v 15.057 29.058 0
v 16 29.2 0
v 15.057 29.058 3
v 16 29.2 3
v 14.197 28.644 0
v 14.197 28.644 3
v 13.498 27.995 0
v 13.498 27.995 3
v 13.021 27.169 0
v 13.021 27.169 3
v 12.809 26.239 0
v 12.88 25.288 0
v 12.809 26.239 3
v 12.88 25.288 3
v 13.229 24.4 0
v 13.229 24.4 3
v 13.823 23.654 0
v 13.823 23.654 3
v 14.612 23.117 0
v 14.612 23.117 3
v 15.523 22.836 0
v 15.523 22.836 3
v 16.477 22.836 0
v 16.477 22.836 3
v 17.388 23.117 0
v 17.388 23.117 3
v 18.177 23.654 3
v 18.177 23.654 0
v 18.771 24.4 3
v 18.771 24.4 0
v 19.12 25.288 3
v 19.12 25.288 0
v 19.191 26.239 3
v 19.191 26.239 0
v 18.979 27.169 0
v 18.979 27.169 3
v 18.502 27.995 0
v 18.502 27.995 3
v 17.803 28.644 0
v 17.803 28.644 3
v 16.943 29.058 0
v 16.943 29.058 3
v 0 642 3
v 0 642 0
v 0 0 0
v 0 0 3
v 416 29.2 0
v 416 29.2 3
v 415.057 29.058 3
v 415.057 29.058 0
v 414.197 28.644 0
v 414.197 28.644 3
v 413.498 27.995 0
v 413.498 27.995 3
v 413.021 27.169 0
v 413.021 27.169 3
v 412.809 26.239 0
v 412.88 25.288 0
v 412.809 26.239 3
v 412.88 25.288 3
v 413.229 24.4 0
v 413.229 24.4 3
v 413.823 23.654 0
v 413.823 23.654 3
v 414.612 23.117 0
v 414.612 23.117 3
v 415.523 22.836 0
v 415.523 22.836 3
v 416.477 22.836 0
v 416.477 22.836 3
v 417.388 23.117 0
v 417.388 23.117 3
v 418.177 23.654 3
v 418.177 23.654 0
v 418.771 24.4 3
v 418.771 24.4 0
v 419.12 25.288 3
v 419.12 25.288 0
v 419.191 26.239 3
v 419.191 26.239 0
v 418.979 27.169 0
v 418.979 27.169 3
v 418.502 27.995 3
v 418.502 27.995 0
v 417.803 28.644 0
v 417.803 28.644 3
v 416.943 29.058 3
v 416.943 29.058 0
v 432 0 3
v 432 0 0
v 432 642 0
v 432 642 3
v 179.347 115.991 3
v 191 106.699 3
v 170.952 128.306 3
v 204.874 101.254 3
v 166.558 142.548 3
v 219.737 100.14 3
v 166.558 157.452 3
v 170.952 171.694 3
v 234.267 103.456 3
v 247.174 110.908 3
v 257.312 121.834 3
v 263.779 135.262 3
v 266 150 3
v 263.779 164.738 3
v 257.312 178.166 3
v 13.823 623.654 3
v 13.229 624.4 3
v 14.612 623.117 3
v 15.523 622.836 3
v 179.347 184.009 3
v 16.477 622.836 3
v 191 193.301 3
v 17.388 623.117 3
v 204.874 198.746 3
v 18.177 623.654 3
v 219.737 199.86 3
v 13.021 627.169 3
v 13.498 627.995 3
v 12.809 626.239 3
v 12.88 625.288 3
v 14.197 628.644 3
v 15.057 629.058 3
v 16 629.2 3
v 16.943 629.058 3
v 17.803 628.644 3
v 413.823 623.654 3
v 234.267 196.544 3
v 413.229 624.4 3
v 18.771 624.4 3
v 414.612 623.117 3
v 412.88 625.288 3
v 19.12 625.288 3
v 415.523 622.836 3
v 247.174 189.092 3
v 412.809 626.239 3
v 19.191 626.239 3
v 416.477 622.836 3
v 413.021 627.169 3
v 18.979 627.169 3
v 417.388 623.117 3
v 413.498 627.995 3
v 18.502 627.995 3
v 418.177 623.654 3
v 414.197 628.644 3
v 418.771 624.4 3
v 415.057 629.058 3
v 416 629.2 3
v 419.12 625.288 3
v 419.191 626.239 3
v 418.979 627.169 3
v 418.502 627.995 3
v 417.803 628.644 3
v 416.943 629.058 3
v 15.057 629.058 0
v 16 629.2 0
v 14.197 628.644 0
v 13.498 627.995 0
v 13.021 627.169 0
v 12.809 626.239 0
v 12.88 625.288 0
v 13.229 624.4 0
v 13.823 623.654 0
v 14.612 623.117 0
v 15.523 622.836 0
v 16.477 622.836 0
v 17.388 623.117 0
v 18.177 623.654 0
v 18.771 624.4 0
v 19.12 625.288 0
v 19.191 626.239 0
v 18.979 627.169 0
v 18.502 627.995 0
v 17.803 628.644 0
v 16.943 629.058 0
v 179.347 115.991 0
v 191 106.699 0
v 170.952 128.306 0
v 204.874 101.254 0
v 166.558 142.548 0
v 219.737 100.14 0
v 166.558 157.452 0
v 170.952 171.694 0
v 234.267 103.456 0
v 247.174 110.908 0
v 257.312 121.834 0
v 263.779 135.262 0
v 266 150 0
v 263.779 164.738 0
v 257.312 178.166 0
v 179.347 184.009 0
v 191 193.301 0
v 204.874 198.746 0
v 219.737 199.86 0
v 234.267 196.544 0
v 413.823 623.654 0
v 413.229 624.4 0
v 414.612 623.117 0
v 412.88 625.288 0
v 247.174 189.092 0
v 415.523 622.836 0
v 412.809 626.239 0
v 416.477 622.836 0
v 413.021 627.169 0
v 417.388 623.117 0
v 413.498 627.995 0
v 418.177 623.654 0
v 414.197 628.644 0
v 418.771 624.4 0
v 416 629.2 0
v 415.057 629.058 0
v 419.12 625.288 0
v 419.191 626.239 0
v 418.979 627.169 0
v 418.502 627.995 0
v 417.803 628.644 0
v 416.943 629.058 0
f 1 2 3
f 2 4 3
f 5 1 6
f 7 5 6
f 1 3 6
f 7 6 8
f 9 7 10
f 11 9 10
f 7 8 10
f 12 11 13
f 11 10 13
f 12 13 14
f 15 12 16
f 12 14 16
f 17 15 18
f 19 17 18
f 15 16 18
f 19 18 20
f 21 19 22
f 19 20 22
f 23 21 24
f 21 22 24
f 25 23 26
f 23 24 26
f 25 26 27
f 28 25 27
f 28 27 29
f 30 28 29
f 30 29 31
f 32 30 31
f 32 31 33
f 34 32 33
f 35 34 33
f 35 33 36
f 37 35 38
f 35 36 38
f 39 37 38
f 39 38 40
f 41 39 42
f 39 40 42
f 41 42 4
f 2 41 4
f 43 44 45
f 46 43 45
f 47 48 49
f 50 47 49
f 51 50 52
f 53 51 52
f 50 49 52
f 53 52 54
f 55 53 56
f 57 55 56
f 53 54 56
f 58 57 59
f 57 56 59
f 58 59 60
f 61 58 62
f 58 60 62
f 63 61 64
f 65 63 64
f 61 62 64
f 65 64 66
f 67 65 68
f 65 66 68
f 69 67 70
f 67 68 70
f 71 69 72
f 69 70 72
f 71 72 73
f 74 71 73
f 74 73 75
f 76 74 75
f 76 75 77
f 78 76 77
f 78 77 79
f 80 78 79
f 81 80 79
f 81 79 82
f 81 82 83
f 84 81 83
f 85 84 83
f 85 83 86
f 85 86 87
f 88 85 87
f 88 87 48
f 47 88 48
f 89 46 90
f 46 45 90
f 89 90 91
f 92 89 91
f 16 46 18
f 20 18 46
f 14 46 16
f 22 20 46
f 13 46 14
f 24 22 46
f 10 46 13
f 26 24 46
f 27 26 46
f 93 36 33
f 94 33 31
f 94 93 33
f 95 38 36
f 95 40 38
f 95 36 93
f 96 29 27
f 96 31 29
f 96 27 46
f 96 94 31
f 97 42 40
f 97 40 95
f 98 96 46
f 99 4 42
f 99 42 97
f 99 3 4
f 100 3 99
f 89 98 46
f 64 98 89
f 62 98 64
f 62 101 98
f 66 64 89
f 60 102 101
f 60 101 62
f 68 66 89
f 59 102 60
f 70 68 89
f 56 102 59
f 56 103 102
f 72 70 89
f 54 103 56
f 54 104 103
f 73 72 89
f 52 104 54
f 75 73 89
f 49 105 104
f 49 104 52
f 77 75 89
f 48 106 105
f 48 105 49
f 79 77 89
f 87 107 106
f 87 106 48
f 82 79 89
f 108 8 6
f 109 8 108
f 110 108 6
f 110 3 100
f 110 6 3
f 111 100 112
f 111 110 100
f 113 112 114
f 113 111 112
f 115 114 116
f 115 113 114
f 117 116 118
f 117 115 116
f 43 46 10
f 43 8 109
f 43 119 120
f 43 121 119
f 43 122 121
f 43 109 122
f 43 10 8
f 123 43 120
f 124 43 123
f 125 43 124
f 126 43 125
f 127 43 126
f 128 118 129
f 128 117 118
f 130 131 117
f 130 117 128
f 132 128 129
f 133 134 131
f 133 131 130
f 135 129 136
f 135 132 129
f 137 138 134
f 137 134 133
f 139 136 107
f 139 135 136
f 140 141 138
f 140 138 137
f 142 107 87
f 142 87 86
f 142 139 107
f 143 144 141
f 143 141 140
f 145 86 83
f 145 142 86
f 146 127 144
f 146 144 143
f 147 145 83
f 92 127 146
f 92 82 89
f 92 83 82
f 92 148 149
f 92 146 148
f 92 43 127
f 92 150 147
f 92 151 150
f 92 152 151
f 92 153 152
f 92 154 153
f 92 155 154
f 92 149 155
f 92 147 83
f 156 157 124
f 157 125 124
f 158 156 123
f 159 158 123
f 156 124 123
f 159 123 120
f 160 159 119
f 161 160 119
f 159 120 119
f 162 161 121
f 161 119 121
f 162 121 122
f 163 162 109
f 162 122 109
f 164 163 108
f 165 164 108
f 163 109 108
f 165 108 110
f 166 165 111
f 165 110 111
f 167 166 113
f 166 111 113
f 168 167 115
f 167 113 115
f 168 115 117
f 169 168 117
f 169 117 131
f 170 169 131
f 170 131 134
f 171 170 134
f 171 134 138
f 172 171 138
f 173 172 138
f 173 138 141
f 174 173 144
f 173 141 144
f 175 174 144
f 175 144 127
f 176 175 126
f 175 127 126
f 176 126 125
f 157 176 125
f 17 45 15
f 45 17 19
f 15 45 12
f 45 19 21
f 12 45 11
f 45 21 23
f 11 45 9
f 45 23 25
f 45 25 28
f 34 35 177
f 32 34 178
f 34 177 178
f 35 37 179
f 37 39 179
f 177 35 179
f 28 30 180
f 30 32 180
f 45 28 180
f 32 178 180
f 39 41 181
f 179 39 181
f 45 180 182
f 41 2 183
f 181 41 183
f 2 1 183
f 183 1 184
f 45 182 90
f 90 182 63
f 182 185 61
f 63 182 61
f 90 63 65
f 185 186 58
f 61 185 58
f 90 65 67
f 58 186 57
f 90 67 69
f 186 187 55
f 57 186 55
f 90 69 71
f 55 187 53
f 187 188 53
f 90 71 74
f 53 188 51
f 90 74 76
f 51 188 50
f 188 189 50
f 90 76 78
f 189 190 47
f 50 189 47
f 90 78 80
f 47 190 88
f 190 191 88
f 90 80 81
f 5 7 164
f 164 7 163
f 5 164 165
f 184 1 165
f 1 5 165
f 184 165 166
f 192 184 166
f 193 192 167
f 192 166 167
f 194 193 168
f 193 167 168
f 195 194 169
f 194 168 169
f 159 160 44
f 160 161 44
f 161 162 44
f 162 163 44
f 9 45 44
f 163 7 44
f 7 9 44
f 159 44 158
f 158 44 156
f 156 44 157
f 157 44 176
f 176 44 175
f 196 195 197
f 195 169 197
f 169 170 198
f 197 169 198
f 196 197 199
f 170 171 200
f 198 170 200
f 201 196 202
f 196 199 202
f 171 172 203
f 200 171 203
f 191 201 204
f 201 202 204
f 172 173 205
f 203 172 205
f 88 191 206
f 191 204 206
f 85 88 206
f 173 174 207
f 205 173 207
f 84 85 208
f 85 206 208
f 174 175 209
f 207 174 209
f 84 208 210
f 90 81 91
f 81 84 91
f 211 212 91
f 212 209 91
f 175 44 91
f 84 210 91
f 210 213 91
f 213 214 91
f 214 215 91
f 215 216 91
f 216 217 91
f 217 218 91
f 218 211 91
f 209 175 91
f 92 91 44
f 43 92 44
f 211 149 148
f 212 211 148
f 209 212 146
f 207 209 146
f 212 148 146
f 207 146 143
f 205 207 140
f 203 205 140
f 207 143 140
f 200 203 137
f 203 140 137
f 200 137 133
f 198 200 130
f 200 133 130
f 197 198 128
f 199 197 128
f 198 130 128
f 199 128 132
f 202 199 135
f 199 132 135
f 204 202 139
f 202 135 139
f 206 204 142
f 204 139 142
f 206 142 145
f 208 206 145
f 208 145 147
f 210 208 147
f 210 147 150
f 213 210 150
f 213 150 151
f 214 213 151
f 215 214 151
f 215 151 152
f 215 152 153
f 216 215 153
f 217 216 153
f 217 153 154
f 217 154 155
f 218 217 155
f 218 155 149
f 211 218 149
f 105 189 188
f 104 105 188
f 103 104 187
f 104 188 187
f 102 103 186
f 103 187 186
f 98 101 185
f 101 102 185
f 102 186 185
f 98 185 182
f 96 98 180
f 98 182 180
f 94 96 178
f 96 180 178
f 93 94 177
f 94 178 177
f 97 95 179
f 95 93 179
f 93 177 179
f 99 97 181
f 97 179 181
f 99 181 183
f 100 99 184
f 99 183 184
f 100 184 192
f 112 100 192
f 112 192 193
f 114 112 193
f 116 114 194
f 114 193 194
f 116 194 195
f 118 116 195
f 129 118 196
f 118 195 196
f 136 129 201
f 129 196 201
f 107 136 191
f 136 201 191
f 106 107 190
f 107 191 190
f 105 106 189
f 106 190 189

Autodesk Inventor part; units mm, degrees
ref_plane "YZ Plane" through (0, 0, 0) normal (1, 0, 0) x (0, 1, 0)
ref_plane "XZ Plane" through (0, 0, 0) normal (0, 1, 0) x (-1, 0, 0)
ref_plane "XY Plane" through (0, 0, 0) normal (0, 0, 1) x (1, 0, 0)
sketch "Sketch1" plane through (0, 0, 0) normal (0, 0, 1) x (1, 0, 0)
  line L0 (0, 0) -> (432, 0)
  line L1 (432, 0) -> (432, 642)
  line L2 (432, 642) -> (0, 642)
  line L3 (0, 642) -> (0, 0)
  line L4 (16, 626) -> (16, 26) construction
  line L5 (416, 626) -> (416, 26) construction
  line L6 (16, 626) -> (416, 626) construction
  line L7 (16, 26) -> (416, 26) construction
  circle A0 centre (216, 150) radius 50
  dimension "d0" = 432
  dimension "d1" = 642
  dimension "d2" = 600
  dimension "d3" = 400
  dimension "d4" = 16
  dimension "d5" = 16
  dimension "d6" = 100
  dimension "d7" = 150
  dimension "d8" = 216
extrude "Extrusion1" add sketch "Sketch1" along normal blind 3
hole "Hole1" at (16, 626, 0) at (416, 626, 0) at (416, 26, 0) at (16, 26, 0) direction (0, 0, 1) diameter 6.4 end through all
properties part number "top-ventilation-hole-100mm"
